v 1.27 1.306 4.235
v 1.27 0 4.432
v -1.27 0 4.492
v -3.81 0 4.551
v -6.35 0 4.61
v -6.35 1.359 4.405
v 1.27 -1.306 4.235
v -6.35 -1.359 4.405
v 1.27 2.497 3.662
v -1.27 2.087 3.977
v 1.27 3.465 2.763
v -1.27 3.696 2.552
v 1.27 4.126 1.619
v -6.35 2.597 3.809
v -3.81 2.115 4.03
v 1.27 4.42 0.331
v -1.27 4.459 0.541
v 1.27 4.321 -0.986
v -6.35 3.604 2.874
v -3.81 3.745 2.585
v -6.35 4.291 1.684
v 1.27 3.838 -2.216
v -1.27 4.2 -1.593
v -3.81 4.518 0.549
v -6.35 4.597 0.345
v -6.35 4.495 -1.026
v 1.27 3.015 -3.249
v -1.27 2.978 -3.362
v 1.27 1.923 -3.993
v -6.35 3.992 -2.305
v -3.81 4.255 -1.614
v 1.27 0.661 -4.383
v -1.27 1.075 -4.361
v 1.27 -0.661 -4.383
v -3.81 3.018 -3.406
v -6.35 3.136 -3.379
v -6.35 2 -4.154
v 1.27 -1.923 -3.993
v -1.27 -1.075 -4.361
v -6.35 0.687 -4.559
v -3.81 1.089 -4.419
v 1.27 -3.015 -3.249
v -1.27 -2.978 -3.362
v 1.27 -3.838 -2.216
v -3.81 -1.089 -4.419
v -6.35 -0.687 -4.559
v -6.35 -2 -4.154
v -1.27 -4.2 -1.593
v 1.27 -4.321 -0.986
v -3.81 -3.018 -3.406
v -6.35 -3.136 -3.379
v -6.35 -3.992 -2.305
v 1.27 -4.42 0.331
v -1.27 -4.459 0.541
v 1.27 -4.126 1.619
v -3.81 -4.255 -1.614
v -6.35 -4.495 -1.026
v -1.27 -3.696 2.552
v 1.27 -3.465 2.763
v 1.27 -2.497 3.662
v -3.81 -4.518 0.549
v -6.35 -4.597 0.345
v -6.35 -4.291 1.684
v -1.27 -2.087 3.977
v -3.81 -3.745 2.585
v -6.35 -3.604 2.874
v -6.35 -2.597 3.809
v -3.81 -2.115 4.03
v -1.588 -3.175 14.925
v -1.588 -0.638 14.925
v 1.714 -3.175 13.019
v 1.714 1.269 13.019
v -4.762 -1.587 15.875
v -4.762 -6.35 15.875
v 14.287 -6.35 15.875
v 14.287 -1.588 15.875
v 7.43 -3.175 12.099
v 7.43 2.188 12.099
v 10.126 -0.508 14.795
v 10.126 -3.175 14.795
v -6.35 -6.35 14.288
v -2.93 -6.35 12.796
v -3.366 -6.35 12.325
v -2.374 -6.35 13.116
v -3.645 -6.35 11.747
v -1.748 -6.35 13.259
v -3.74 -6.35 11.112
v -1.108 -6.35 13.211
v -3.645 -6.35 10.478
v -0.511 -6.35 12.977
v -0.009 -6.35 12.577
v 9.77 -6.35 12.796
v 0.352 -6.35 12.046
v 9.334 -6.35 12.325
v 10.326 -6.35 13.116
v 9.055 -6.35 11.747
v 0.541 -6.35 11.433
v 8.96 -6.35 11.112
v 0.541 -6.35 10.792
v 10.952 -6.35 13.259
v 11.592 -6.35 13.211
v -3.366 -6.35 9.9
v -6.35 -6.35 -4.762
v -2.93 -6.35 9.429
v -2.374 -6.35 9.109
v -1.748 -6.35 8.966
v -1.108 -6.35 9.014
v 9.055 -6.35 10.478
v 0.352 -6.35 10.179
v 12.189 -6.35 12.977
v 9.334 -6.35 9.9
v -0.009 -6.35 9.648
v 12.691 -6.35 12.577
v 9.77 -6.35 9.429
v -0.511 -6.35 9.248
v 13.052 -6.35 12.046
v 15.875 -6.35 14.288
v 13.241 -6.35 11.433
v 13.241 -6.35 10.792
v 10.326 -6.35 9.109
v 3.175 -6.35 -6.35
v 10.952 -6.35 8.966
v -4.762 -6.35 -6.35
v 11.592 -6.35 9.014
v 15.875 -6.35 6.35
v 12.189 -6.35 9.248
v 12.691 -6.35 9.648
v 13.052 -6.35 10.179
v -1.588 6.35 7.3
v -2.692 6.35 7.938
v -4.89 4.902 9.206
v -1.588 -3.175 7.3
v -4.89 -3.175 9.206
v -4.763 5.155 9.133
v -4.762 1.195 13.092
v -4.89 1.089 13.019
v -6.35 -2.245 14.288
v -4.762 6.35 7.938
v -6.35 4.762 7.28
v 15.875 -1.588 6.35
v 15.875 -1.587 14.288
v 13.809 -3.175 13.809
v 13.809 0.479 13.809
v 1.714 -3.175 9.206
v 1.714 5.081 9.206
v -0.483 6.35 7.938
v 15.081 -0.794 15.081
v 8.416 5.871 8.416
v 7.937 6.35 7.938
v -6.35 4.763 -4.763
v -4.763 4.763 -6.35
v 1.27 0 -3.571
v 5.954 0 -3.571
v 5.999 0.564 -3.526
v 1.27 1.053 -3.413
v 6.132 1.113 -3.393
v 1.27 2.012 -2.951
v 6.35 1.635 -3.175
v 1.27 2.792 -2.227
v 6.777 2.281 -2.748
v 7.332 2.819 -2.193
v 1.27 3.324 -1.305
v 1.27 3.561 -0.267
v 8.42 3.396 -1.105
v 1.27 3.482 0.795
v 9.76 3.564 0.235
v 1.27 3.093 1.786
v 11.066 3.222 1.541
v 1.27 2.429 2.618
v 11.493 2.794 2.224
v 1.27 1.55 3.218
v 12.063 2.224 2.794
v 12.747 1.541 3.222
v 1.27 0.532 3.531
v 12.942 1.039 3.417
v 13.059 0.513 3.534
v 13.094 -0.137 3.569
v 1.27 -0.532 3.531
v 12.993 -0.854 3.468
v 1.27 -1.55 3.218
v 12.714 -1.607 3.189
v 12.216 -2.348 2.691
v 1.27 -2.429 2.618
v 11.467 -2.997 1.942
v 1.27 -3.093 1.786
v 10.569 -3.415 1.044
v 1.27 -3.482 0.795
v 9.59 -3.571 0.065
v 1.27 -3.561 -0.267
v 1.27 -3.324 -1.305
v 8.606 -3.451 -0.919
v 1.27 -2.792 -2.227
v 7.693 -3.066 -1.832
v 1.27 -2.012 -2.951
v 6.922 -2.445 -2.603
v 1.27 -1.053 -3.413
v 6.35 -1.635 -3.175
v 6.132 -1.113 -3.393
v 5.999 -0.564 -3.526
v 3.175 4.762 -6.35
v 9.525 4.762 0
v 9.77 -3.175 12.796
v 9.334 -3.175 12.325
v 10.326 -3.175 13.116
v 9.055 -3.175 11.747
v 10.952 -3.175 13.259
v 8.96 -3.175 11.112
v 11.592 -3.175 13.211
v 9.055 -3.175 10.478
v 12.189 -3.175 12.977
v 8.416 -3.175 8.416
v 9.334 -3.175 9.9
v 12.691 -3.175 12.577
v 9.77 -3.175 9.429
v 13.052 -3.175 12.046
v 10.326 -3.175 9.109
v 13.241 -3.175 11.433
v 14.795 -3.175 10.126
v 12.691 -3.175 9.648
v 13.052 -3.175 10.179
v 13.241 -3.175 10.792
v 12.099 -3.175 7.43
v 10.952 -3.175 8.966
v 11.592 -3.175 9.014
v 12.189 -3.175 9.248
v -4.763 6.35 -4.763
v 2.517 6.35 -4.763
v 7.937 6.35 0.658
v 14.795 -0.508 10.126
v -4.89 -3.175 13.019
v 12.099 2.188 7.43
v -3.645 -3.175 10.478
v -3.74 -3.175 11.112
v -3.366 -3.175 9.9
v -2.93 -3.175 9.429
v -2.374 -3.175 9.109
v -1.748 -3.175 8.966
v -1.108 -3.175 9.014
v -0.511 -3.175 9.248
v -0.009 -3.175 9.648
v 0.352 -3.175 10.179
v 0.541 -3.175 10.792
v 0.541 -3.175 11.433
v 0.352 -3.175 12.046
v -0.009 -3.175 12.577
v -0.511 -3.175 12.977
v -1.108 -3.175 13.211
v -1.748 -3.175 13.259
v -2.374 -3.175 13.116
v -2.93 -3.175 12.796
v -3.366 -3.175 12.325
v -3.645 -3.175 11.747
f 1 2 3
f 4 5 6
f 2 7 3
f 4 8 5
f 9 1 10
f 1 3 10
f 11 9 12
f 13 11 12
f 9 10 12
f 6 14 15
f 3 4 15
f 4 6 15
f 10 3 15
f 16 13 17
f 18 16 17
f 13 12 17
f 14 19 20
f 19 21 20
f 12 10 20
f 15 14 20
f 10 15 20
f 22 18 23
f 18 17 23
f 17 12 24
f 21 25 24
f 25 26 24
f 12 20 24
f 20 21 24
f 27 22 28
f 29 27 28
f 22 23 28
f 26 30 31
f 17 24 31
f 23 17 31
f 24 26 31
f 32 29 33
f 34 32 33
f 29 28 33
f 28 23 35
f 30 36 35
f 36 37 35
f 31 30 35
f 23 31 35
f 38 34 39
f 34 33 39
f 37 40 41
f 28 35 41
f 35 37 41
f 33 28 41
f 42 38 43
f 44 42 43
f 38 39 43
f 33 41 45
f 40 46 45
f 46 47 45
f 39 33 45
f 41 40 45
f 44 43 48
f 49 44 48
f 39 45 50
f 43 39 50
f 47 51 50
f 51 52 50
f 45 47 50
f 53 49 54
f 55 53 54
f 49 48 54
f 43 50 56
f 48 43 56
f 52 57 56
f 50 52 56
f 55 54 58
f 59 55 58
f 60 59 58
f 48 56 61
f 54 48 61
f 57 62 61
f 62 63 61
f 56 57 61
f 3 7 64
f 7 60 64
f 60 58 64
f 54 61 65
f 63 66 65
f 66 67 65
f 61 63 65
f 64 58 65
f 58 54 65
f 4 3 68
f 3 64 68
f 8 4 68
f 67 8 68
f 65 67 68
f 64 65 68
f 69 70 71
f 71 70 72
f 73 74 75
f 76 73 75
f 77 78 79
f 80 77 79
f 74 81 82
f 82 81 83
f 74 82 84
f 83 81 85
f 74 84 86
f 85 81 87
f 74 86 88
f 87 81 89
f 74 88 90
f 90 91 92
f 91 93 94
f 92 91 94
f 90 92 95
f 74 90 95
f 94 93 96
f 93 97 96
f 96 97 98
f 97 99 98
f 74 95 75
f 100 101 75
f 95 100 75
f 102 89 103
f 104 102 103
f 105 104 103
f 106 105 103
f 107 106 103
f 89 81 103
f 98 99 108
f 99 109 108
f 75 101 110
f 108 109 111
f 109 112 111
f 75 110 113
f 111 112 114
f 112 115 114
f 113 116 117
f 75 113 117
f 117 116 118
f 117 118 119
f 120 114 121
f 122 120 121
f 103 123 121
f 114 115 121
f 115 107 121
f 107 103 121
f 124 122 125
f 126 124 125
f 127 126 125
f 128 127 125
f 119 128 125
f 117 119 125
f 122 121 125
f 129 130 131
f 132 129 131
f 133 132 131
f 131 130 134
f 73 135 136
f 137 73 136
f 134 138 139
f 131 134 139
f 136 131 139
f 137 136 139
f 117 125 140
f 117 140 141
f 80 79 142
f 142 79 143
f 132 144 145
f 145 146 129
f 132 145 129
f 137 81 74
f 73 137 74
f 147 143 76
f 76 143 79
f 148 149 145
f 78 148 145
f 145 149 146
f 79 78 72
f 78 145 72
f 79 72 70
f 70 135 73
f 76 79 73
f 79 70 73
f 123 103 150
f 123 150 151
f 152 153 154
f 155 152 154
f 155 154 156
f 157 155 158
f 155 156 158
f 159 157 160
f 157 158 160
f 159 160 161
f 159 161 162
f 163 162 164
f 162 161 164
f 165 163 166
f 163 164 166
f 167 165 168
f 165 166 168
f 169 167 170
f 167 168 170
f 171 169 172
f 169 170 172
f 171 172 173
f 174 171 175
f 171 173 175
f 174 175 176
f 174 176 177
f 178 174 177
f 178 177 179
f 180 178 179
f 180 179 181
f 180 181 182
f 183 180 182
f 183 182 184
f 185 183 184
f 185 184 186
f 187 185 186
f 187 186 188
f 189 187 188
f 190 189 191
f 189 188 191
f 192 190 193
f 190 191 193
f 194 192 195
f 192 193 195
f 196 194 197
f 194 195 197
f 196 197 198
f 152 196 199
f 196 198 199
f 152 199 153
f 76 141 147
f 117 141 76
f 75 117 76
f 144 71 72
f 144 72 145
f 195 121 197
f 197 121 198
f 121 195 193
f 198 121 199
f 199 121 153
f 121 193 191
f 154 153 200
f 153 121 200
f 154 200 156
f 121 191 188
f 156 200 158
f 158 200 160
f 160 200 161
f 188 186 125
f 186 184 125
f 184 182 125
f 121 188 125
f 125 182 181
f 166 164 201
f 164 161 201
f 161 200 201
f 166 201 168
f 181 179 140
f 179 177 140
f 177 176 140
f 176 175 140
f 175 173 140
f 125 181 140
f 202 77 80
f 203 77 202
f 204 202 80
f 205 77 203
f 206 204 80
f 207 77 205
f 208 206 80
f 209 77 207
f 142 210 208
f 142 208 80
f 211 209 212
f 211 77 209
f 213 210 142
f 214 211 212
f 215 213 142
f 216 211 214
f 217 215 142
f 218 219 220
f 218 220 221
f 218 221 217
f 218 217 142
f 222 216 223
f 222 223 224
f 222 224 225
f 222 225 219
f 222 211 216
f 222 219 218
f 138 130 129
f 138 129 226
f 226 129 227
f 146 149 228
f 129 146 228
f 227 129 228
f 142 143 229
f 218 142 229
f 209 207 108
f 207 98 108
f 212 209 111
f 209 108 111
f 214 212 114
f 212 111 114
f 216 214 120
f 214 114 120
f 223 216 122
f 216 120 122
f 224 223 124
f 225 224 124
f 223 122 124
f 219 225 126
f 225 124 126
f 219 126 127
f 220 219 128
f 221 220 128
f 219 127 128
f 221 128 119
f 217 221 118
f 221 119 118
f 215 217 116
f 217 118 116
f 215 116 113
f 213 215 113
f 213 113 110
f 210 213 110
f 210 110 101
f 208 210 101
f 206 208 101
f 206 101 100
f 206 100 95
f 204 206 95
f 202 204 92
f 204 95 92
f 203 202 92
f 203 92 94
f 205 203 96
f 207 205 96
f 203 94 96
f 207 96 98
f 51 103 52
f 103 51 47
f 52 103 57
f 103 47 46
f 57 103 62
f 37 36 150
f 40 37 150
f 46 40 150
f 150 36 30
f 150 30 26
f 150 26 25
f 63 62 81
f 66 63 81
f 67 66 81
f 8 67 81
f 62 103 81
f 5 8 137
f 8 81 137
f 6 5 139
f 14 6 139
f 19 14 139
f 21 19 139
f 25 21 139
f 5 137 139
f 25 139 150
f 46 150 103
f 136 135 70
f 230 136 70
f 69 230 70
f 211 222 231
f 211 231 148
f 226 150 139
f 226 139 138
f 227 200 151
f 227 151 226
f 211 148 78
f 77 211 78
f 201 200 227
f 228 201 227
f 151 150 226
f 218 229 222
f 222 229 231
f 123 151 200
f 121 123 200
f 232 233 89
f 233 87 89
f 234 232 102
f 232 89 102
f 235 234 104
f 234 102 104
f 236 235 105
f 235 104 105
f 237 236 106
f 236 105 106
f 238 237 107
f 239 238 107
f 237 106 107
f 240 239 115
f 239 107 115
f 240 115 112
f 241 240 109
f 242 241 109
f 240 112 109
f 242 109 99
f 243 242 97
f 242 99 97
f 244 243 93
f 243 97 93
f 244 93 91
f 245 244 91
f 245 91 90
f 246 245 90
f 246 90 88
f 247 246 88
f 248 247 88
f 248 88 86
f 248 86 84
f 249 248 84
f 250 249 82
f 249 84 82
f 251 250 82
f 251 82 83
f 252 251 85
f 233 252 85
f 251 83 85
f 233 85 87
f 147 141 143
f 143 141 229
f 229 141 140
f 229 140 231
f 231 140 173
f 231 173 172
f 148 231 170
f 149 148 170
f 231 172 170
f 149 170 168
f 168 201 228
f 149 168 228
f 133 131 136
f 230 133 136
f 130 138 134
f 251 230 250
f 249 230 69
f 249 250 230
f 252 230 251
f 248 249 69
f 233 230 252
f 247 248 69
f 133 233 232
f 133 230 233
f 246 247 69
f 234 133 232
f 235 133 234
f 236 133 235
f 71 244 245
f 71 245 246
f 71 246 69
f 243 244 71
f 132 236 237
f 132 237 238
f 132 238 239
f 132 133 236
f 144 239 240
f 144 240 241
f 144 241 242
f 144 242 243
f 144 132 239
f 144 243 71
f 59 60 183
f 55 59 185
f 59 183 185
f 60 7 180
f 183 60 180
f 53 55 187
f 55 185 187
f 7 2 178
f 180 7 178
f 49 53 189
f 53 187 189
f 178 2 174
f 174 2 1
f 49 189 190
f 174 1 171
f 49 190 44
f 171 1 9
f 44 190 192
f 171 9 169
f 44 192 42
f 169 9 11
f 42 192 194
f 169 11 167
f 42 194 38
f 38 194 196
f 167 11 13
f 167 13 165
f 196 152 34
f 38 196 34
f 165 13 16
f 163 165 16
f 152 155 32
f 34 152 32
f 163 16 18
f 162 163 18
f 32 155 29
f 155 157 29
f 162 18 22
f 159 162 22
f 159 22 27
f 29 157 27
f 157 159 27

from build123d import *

# Parameters (mm, degrees)
SKETCH1_W               = 12.7
SKETCH1_H               = 12.7
BOSS_EXTRUDE1_DEPTH     = 6.35
SKETCH2_W               = 22.225
SKETCH2_H               = 9.525
BOSS_EXTRUDE2_DEPTH     = 4.7625
CHAMFER1_START          = -6.35
CHAMFER1_DEPTH          = 12.7
CUT_EXTRUDE1_DEPTH      = 7.9375
F_6_CLEARANCE_HOLE1_D   = 4.3053
CHAMFER3_SIZE           = 9.525
F_1_4_CLEARANCE_HOLE1_D = 7.14248
CUT_EXTRUDE2_DEPTH      = 9.525
CUT_EXTRUDE3_DEPTH      = 26.793821935


with BuildPart() as part:
    # Sketch1 → Boss-Extrude1 (new, symmetric)
    with BuildSketch(Plane(origin=(0, 0, 0), x_dir=(1, 0, 0), z_dir=(0, 1, 0))):
        Rectangle(SKETCH1_W, SKETCH1_H)
    extrude(amount=BOSS_EXTRUDE1_DEPTH, both=True)

    # Sketch2 → Boss-Extrude2 (add)
    with BuildSketch(Plane.XZ.offset(6.35)):
        with Locations((4.7625, 11.1125)):
            Rectangle(SKETCH2_W, SKETCH2_H)
    extrude(amount=-BOSS_EXTRUDE2_DEPTH)

    # Chamfer1: read off the stored shape, not the designer's step
    # Chamfer1 outline → Chamfer1 (add)
    with BuildSketch(Plane(origin=(0, 0, 0), x_dir=(1, 0, 0), z_dir=(0, 1, 0)).offset(CHAMFER1_START)):
        Polygon((15.875, -6.35), (6.35, 3.175), (6.35, -6.35), align=None)
    extrude(amount=CHAMFER1_DEPTH)

    # Sketch3 → Cut-Extrude1 (cut)
    with BuildSketch(Plane(origin=(0, 6.35, 0), x_dir=(1, 0, 0), z_dir=(0, 1, 0))):
        Polygon((6.35, 3.175), (6.35, -6.35), (15.875, -6.35), align=None)
    extrude(amount=-CUT_EXTRUDE1_DEPTH, mode=Mode.SUBTRACT)

    # #6 Clearance Hole1 (through all)
    with Locations(Plane(origin=(0, -1.5875, 0), x_dir=(1, 0, 0), z_dir=(0, 1, 0))):
        with Locations((-1.5875, -11.1125), (11.1125, -11.1125)):
            Hole(F_6_CLEARANCE_HOLE1_D / 2)

    # Chamfer3
    # the kernel refuses this chamfer: 9.525 mm, written as the material it adds along each edge
    with BuildSketch(Plane(origin=(6.35, -1.5875, -27.67028046), x_dir=(1, 0, 0), z_dir=(0, 0, 1))) as chamfer3_piece_1_section:
        Polygon((CHAMFER3_SIZE, 0), (0, CHAMFER3_SIZE), (0, 0), align=None)
    chamfer3_piece_1 = extrude(amount=34.02028046, mode=Mode.PRIVATE)
    chamfer3_piece_1 = split(chamfer3_piece_1, bisect_by=Plane(origin=(6.35, 6.35, -27.67028046), z_dir=(0, -1, 0)), keep=Keep.TOP, mode=Mode.PRIVATE)
    chamfer3_piece_1 = split(chamfer3_piece_1, bisect_by=Plane(origin=(-5.89764023, -1.5875, -15.42264023), z_dir=(-0.7071067811865475, 0, 0.7071067811865476)), keep=Keep.TOP, mode=Mode.PRIVATE)
    add(chamfer3_piece_1)
    with BuildSketch(Plane(origin=(-6.35, -1.5875, 6.35), x_dir=(0, 1, 0), z_dir=(1, 0, 0))) as chamfer3_piece_2_section:
        Polygon((CHAMFER3_SIZE, 0), (0, CHAMFER3_SIZE), (0, 0), align=None)
    chamfer3_piece_2 = extrude(amount=12.7, mode=Mode.PRIVATE)
    chamfer3_piece_2 = split(chamfer3_piece_2, bisect_by=Plane(origin=(-6.35, 6.35, 6.35), z_dir=(0, -1, 0)), keep=Keep.TOP, mode=Mode.PRIVATE)
    chamfer3_piece_2 = chamfer3_piece_2 - Plane(origin=(-1.5875, -1.5875, 11.1125), x_dir=(-1, 0, 0), z_dir=(0, -1, 0)) * Cylinder(2.15265, 64, mode=Mode.PRIVATE)
    add(chamfer3_piece_2)
    with BuildSketch(Plane(origin=(-6.35, -1.5875, 6.35), x_dir=(0, 1, 0), z_dir=(1, 0, 0))) as chamfer3_piece_3a_section:
        Polygon((CHAMFER3_SIZE, 0), (0, CHAMFER3_SIZE), (0, 0), align=None)
    chamfer3_piece_3a = extrude(amount=37.19528046, mode=Mode.PRIVATE)
    chamfer3_piece_3a = split(chamfer3_piece_3a, bisect_by=Plane(origin=(-6.35, 6.35, 6.35), z_dir=(0, -1, 0)), keep=Keep.TOP, mode=Mode.PRIVATE)
    chamfer3_piece_3a = split(chamfer3_piece_3a, bisect_by=Plane(origin=(6.35, -1.5875, 6.35), z_dir=(1, 0, 0)), keep=Keep.TOP, mode=Mode.PRIVATE)
    chamfer3_piece_3a = split(chamfer3_piece_3a, bisect_by=Plane(origin=(15.875, -1.5875, 6.35), z_dir=(-1, 0, 0)), keep=Keep.TOP, mode=Mode.PRIVATE)
    chamfer3_piece_3a = chamfer3_piece_3a - Plane(origin=(11.1125, -1.5875, 11.1125), x_dir=(-1, 0, 0), z_dir=(0, -1, 0)) * Cylinder(2.15265, 113, mode=Mode.PRIVATE)
    with BuildSketch(Plane(origin=(6.35, -1.5875, -27.67028046), x_dir=(1, 0, 0), z_dir=(0, 0, 1))) as chamfer3_piece_3b_section:
        Polygon((CHAMFER3_SIZE, 0), (0, CHAMFER3_SIZE), (0, 0), align=None)
    chamfer3_piece_3b = extrude(amount=58.515560921, mode=Mode.PRIVATE)
    chamfer3_piece_3b = split(chamfer3_piece_3b, bisect_by=Plane(origin=(6.35, -1.5875, 6.35), z_dir=(0, 0, 1)), keep=Keep.TOP, mode=Mode.PRIVATE)
    chamfer3_piece_3b = split(chamfer3_piece_3b, bisect_by=Plane(origin=(6.35, 6.35, -27.67028046), z_dir=(0, -1, 0)), keep=Keep.TOP, mode=Mode.PRIVATE)
    chamfer3_piece_3b = split(chamfer3_piece_3b, bisect_by=Plane(origin=(6.35, -1.5875, 15.875), z_dir=(0, 0, -1)), keep=Keep.TOP, mode=Mode.PRIVATE)
    chamfer3_piece_3b = chamfer3_piece_3b - Plane(origin=(11.1125, -1.5875, 11.1125), x_dir=(-1, 0, 0), z_dir=(0, -1, 0)) * Cylinder(2.15265, 156, mode=Mode.PRIVATE)
    chamfer3_piece_3 = chamfer3_piece_3a & chamfer3_piece_3b
    add(chamfer3_piece_3)

    # Sketch9 → Hole1 (revolve, cut)
    with BuildSketch(Plane(origin=(-6.35, 0, 0), x_dir=(0, 0, 1), z_dir=(0, 1, 0))):
        Polygon((0, 0), (0, 7.62), (4.4323, 7.62), (4.6101, 0), align=None)
    revolve(axis=Axis((103.65, 0, 0), (-1, 0, 0)), mode=Mode.SUBTRACT)

    # 1/4 Clearance Hole1 (through all)
    with Locations(Plane.ZY.offset(6.35)):
        with Locations((0, 0)):
            Hole(F_1_4_CLEARANCE_HOLE1_D / 2)

    # Sketch12 → Cut-Extrude2 (cut)
    with BuildSketch(Plane(origin=(0, 6.35, 0), x_dir=(1, 0, 0), z_dir=(0, 1, 0))):
        Polygon((-4.8895, -9.206089411), (-4.8895, -13.018910589), (-1.5875, -14.925321178), (1.7145, -13.018910589), (1.7145, -9.206089411), (-1.5875, -7.299678822), align=None)
        Polygon((8.41642829, -8.41642829), (7.429597553, -12.099330736), (10.125669264, -14.795402447), (13.80857171, -13.80857171), (14.795402447, -10.125669264), (12.099330736, -7.429597553), align=None)
    extrude(amount=-CUT_EXTRUDE2_DEPTH, mode=Mode.SUBTRACT)

    # Sketch15 → Cut-Extrude3 (cut, through all)
    with BuildSketch(Plane(origin=(0, 6.35, 0), x_dir=(1, 0, 0), z_dir=(0, 1, 0))):
        Polygon((6.35, 3.175), (3.175, 6.35), (6.35, 6.35), align=None)
    extrude(amount=-CUT_EXTRUDE3_DEPTH, mode=Mode.SUBTRACT)

    # Chamfer4
    # the kernel refuses this chamfer: 1.5875 mm, written as the material it takes off along each edge
    with BuildSketch(Plane(origin=(-5.291666667, 5.291666667, -5.291666667), x_dir=(0.7071067811865476, 0.7071067811865476, 0), z_dir=(-0.5773502691896257, 0.577350269189626, -0.5773502691896257))) as chamfer4_piece_1:
        Polygon((-1.122532015, -0.648094161), (1.122532015, -0.648094161), (0, 1.296188322), align=None)
    extrude(amount=2.016395815, mode=Mode.SUBTRACT)
    with BuildSketch(Plane(origin=(15.875, -10.432546743, 15.875), x_dir=(0, 0, -1), z_dir=(0, 1, 0))) as chamfer4_piece_2:
        with BuildLine():
            Line((1.632401281, -0.044901281), (-0.044901281, 1.632401281))
            Line((-0.044901281, 1.632401281), (-0.076651281, 1.632401281))
            ThreePointArc((-0.076651281, 1.632401281), (-0.03175, 0.81620064), (-0.03175, 0))
            Line((-0.03175, 0), (0, -0.03175))
            ThreePointArc((0, -0.03175), (0.81620064, -0.03175), (1.632401281, -0.076651281))
            Line((1.632401281, -0.076651281), (1.632401281, -0.044901281))
        make_face()
    extrude(amount=12.927593487, mode=Mode.SUBTRACT)
    with BuildSketch(Plane(origin=(-10.432546743, 6.35, -6.35), x_dir=(0, -1, 0), z_dir=(1, 0, 0))) as chamfer4_piece_3:
        with BuildLine():
            Line((1.632401281, 0.044901281), (-0.044901281, -1.632401281))
            Line((-0.044901281, -1.632401281), (-0.076651281, -1.632401281))
            ThreePointArc((-0.076651281, -1.632401281), (-0.03175, -0.81620064), (-0.03175, 0))
            Line((-0.03175, 0), (0, 0.03175))
            ThreePointArc((0, 0.03175), (0.81620064, 0.03175), (1.632401281, 0.076651281))
            Line((1.632401281, 0.076651281), (1.632401281, 0.044901281))
        make_face()
    extrude(amount=17.690093487, mode=Mode.SUBTRACT)
    with BuildSketch(Plane(origin=(-6.35, -10.432546743, 15.875), x_dir=(0, 0, -1), z_dir=(0, 1, 0))) as chamfer4_piece_4:
        with BuildLine():
            Line((1.632401281, 0.044901281), (-0.044901281, -1.632401281))
            Line((-0.044901281, -1.632401281), (-0.076651281, -1.632401281))
            ThreePointArc((-0.076651281, -1.632401281), (-0.03175, -0.81620064), (-0.03175, 0))
            Line((-0.03175, 0), (0, 0.03175))
            ThreePointArc((0, 0.03175), (0.81620064, 0.03175), (1.632401281, 0.076651281))
            Line((1.632401281, 0.076651281), (1.632401281, 0.044901281))
        make_face()
    extrude(amount=12.927593487, mode=Mode.SUBTRACT)
    with BuildSketch(Plane(origin=(-6.35, 9.236796487, 5.050703513), x_dir=(1, 0, 0), z_dir=(0, -0.7071067811865476, 0.7071067811865476))) as chamfer4_piece_5:
        with BuildLine():
            Line((1.632401281, 0.044901281), (-0.044901281, -1.632401281))
            Line((-0.044901281, -1.632401281), (-0.076651281, -1.632401281))
            ThreePointArc((-0.076651281, -1.632401281), (-0.03175, -0.81620064), (-0.03175, 0))
            Line((-0.03175, 0), (0, 0.03175))
            ThreePointArc((0, 0.03175), (0.81620064, 0.03175), (1.632401281, 0.076651281))
            Line((1.632401281, 0.076651281), (1.632401281, 0.044901281))
        make_face()
    extrude(amount=19.390413638, mode=Mode.SUBTRACT)
    with BuildSketch(Plane(origin=(-6.35, 6.35, 12.020046743), x_dir=(0, -1, 0), z_dir=(0, 0, -1))) as chamfer4_piece_6:
        with BuildLine():
            Line((1.632401281, 0.044901281), (-0.044901281, -1.632401281))
            Line((-0.044901281, -1.632401281), (-0.076651281, -1.632401281))
            ThreePointArc((-0.076651281, -1.632401281), (-0.03175, -0.81620064), (-0.03175, 0))
            Line((-0.03175, 0), (0, 0.03175))
            ThreePointArc((0, 0.03175), (0.81620064, 0.03175), (1.632401281, 0.076651281))
            Line((1.632401281, 0.076651281), (1.632401281, 0.044901281))
        make_face()
    extrude(amount=22.452593487, mode=Mode.SUBTRACT)
    with BuildSketch(Plane(origin=(-6.35, 10.432546743, -6.35), x_dir=(0, 0, 1), z_dir=(0, -1, 0))) as chamfer4_piece_7:
        with BuildLine():
            Line((1.632401281, 0.044901281), (-0.044901281, -1.632401281))
            Line((-0.044901281, -1.632401281), (-0.076651281, -1.632401281))
            ThreePointArc((-0.076651281, -1.632401281), (-0.03175, -0.81620064), (-0.03175, 0))
            Line((-0.03175, 0), (0, 0.03175))
            ThreePointArc((0, 0.03175), (0.81620064, 0.03175), (1.632401281, 0.076651281))
            Line((1.632401281, 0.076651281), (1.632401281, 0.044901281))
        make_face()
    extrude(amount=20.865093487, mode=Mode.SUBTRACT)
    with BuildSketch(Plane(origin=(10.824296487, 6.35, 1.299296487), x_dir=(0, -1, 0), z_dir=(-0.7071067811865507, 0, -0.7071067811865444))) as chamfer4_piece_8:
        with BuildLine():
            Line((1.632401281, -0.044901281), (-0.044901281, 1.632401281))
            Line((-0.044901281, 1.632401281), (-0.076651281, 1.632401281))
            ThreePointArc((-0.076651281, 1.632401281), (-0.03175, 0.81620064), (-0.03175, 0))
            Line((-0.03175, 0), (0, -0.03175))
            ThreePointArc((0, -0.03175), (0.81620064, -0.03175), (1.632401281, -0.076651281))
            Line((1.632401281, -0.076651281), (1.632401281, -0.044901281))
        make_face()
    extrude(amount=14.900285578, mode=Mode.SUBTRACT)


solid = part.part
